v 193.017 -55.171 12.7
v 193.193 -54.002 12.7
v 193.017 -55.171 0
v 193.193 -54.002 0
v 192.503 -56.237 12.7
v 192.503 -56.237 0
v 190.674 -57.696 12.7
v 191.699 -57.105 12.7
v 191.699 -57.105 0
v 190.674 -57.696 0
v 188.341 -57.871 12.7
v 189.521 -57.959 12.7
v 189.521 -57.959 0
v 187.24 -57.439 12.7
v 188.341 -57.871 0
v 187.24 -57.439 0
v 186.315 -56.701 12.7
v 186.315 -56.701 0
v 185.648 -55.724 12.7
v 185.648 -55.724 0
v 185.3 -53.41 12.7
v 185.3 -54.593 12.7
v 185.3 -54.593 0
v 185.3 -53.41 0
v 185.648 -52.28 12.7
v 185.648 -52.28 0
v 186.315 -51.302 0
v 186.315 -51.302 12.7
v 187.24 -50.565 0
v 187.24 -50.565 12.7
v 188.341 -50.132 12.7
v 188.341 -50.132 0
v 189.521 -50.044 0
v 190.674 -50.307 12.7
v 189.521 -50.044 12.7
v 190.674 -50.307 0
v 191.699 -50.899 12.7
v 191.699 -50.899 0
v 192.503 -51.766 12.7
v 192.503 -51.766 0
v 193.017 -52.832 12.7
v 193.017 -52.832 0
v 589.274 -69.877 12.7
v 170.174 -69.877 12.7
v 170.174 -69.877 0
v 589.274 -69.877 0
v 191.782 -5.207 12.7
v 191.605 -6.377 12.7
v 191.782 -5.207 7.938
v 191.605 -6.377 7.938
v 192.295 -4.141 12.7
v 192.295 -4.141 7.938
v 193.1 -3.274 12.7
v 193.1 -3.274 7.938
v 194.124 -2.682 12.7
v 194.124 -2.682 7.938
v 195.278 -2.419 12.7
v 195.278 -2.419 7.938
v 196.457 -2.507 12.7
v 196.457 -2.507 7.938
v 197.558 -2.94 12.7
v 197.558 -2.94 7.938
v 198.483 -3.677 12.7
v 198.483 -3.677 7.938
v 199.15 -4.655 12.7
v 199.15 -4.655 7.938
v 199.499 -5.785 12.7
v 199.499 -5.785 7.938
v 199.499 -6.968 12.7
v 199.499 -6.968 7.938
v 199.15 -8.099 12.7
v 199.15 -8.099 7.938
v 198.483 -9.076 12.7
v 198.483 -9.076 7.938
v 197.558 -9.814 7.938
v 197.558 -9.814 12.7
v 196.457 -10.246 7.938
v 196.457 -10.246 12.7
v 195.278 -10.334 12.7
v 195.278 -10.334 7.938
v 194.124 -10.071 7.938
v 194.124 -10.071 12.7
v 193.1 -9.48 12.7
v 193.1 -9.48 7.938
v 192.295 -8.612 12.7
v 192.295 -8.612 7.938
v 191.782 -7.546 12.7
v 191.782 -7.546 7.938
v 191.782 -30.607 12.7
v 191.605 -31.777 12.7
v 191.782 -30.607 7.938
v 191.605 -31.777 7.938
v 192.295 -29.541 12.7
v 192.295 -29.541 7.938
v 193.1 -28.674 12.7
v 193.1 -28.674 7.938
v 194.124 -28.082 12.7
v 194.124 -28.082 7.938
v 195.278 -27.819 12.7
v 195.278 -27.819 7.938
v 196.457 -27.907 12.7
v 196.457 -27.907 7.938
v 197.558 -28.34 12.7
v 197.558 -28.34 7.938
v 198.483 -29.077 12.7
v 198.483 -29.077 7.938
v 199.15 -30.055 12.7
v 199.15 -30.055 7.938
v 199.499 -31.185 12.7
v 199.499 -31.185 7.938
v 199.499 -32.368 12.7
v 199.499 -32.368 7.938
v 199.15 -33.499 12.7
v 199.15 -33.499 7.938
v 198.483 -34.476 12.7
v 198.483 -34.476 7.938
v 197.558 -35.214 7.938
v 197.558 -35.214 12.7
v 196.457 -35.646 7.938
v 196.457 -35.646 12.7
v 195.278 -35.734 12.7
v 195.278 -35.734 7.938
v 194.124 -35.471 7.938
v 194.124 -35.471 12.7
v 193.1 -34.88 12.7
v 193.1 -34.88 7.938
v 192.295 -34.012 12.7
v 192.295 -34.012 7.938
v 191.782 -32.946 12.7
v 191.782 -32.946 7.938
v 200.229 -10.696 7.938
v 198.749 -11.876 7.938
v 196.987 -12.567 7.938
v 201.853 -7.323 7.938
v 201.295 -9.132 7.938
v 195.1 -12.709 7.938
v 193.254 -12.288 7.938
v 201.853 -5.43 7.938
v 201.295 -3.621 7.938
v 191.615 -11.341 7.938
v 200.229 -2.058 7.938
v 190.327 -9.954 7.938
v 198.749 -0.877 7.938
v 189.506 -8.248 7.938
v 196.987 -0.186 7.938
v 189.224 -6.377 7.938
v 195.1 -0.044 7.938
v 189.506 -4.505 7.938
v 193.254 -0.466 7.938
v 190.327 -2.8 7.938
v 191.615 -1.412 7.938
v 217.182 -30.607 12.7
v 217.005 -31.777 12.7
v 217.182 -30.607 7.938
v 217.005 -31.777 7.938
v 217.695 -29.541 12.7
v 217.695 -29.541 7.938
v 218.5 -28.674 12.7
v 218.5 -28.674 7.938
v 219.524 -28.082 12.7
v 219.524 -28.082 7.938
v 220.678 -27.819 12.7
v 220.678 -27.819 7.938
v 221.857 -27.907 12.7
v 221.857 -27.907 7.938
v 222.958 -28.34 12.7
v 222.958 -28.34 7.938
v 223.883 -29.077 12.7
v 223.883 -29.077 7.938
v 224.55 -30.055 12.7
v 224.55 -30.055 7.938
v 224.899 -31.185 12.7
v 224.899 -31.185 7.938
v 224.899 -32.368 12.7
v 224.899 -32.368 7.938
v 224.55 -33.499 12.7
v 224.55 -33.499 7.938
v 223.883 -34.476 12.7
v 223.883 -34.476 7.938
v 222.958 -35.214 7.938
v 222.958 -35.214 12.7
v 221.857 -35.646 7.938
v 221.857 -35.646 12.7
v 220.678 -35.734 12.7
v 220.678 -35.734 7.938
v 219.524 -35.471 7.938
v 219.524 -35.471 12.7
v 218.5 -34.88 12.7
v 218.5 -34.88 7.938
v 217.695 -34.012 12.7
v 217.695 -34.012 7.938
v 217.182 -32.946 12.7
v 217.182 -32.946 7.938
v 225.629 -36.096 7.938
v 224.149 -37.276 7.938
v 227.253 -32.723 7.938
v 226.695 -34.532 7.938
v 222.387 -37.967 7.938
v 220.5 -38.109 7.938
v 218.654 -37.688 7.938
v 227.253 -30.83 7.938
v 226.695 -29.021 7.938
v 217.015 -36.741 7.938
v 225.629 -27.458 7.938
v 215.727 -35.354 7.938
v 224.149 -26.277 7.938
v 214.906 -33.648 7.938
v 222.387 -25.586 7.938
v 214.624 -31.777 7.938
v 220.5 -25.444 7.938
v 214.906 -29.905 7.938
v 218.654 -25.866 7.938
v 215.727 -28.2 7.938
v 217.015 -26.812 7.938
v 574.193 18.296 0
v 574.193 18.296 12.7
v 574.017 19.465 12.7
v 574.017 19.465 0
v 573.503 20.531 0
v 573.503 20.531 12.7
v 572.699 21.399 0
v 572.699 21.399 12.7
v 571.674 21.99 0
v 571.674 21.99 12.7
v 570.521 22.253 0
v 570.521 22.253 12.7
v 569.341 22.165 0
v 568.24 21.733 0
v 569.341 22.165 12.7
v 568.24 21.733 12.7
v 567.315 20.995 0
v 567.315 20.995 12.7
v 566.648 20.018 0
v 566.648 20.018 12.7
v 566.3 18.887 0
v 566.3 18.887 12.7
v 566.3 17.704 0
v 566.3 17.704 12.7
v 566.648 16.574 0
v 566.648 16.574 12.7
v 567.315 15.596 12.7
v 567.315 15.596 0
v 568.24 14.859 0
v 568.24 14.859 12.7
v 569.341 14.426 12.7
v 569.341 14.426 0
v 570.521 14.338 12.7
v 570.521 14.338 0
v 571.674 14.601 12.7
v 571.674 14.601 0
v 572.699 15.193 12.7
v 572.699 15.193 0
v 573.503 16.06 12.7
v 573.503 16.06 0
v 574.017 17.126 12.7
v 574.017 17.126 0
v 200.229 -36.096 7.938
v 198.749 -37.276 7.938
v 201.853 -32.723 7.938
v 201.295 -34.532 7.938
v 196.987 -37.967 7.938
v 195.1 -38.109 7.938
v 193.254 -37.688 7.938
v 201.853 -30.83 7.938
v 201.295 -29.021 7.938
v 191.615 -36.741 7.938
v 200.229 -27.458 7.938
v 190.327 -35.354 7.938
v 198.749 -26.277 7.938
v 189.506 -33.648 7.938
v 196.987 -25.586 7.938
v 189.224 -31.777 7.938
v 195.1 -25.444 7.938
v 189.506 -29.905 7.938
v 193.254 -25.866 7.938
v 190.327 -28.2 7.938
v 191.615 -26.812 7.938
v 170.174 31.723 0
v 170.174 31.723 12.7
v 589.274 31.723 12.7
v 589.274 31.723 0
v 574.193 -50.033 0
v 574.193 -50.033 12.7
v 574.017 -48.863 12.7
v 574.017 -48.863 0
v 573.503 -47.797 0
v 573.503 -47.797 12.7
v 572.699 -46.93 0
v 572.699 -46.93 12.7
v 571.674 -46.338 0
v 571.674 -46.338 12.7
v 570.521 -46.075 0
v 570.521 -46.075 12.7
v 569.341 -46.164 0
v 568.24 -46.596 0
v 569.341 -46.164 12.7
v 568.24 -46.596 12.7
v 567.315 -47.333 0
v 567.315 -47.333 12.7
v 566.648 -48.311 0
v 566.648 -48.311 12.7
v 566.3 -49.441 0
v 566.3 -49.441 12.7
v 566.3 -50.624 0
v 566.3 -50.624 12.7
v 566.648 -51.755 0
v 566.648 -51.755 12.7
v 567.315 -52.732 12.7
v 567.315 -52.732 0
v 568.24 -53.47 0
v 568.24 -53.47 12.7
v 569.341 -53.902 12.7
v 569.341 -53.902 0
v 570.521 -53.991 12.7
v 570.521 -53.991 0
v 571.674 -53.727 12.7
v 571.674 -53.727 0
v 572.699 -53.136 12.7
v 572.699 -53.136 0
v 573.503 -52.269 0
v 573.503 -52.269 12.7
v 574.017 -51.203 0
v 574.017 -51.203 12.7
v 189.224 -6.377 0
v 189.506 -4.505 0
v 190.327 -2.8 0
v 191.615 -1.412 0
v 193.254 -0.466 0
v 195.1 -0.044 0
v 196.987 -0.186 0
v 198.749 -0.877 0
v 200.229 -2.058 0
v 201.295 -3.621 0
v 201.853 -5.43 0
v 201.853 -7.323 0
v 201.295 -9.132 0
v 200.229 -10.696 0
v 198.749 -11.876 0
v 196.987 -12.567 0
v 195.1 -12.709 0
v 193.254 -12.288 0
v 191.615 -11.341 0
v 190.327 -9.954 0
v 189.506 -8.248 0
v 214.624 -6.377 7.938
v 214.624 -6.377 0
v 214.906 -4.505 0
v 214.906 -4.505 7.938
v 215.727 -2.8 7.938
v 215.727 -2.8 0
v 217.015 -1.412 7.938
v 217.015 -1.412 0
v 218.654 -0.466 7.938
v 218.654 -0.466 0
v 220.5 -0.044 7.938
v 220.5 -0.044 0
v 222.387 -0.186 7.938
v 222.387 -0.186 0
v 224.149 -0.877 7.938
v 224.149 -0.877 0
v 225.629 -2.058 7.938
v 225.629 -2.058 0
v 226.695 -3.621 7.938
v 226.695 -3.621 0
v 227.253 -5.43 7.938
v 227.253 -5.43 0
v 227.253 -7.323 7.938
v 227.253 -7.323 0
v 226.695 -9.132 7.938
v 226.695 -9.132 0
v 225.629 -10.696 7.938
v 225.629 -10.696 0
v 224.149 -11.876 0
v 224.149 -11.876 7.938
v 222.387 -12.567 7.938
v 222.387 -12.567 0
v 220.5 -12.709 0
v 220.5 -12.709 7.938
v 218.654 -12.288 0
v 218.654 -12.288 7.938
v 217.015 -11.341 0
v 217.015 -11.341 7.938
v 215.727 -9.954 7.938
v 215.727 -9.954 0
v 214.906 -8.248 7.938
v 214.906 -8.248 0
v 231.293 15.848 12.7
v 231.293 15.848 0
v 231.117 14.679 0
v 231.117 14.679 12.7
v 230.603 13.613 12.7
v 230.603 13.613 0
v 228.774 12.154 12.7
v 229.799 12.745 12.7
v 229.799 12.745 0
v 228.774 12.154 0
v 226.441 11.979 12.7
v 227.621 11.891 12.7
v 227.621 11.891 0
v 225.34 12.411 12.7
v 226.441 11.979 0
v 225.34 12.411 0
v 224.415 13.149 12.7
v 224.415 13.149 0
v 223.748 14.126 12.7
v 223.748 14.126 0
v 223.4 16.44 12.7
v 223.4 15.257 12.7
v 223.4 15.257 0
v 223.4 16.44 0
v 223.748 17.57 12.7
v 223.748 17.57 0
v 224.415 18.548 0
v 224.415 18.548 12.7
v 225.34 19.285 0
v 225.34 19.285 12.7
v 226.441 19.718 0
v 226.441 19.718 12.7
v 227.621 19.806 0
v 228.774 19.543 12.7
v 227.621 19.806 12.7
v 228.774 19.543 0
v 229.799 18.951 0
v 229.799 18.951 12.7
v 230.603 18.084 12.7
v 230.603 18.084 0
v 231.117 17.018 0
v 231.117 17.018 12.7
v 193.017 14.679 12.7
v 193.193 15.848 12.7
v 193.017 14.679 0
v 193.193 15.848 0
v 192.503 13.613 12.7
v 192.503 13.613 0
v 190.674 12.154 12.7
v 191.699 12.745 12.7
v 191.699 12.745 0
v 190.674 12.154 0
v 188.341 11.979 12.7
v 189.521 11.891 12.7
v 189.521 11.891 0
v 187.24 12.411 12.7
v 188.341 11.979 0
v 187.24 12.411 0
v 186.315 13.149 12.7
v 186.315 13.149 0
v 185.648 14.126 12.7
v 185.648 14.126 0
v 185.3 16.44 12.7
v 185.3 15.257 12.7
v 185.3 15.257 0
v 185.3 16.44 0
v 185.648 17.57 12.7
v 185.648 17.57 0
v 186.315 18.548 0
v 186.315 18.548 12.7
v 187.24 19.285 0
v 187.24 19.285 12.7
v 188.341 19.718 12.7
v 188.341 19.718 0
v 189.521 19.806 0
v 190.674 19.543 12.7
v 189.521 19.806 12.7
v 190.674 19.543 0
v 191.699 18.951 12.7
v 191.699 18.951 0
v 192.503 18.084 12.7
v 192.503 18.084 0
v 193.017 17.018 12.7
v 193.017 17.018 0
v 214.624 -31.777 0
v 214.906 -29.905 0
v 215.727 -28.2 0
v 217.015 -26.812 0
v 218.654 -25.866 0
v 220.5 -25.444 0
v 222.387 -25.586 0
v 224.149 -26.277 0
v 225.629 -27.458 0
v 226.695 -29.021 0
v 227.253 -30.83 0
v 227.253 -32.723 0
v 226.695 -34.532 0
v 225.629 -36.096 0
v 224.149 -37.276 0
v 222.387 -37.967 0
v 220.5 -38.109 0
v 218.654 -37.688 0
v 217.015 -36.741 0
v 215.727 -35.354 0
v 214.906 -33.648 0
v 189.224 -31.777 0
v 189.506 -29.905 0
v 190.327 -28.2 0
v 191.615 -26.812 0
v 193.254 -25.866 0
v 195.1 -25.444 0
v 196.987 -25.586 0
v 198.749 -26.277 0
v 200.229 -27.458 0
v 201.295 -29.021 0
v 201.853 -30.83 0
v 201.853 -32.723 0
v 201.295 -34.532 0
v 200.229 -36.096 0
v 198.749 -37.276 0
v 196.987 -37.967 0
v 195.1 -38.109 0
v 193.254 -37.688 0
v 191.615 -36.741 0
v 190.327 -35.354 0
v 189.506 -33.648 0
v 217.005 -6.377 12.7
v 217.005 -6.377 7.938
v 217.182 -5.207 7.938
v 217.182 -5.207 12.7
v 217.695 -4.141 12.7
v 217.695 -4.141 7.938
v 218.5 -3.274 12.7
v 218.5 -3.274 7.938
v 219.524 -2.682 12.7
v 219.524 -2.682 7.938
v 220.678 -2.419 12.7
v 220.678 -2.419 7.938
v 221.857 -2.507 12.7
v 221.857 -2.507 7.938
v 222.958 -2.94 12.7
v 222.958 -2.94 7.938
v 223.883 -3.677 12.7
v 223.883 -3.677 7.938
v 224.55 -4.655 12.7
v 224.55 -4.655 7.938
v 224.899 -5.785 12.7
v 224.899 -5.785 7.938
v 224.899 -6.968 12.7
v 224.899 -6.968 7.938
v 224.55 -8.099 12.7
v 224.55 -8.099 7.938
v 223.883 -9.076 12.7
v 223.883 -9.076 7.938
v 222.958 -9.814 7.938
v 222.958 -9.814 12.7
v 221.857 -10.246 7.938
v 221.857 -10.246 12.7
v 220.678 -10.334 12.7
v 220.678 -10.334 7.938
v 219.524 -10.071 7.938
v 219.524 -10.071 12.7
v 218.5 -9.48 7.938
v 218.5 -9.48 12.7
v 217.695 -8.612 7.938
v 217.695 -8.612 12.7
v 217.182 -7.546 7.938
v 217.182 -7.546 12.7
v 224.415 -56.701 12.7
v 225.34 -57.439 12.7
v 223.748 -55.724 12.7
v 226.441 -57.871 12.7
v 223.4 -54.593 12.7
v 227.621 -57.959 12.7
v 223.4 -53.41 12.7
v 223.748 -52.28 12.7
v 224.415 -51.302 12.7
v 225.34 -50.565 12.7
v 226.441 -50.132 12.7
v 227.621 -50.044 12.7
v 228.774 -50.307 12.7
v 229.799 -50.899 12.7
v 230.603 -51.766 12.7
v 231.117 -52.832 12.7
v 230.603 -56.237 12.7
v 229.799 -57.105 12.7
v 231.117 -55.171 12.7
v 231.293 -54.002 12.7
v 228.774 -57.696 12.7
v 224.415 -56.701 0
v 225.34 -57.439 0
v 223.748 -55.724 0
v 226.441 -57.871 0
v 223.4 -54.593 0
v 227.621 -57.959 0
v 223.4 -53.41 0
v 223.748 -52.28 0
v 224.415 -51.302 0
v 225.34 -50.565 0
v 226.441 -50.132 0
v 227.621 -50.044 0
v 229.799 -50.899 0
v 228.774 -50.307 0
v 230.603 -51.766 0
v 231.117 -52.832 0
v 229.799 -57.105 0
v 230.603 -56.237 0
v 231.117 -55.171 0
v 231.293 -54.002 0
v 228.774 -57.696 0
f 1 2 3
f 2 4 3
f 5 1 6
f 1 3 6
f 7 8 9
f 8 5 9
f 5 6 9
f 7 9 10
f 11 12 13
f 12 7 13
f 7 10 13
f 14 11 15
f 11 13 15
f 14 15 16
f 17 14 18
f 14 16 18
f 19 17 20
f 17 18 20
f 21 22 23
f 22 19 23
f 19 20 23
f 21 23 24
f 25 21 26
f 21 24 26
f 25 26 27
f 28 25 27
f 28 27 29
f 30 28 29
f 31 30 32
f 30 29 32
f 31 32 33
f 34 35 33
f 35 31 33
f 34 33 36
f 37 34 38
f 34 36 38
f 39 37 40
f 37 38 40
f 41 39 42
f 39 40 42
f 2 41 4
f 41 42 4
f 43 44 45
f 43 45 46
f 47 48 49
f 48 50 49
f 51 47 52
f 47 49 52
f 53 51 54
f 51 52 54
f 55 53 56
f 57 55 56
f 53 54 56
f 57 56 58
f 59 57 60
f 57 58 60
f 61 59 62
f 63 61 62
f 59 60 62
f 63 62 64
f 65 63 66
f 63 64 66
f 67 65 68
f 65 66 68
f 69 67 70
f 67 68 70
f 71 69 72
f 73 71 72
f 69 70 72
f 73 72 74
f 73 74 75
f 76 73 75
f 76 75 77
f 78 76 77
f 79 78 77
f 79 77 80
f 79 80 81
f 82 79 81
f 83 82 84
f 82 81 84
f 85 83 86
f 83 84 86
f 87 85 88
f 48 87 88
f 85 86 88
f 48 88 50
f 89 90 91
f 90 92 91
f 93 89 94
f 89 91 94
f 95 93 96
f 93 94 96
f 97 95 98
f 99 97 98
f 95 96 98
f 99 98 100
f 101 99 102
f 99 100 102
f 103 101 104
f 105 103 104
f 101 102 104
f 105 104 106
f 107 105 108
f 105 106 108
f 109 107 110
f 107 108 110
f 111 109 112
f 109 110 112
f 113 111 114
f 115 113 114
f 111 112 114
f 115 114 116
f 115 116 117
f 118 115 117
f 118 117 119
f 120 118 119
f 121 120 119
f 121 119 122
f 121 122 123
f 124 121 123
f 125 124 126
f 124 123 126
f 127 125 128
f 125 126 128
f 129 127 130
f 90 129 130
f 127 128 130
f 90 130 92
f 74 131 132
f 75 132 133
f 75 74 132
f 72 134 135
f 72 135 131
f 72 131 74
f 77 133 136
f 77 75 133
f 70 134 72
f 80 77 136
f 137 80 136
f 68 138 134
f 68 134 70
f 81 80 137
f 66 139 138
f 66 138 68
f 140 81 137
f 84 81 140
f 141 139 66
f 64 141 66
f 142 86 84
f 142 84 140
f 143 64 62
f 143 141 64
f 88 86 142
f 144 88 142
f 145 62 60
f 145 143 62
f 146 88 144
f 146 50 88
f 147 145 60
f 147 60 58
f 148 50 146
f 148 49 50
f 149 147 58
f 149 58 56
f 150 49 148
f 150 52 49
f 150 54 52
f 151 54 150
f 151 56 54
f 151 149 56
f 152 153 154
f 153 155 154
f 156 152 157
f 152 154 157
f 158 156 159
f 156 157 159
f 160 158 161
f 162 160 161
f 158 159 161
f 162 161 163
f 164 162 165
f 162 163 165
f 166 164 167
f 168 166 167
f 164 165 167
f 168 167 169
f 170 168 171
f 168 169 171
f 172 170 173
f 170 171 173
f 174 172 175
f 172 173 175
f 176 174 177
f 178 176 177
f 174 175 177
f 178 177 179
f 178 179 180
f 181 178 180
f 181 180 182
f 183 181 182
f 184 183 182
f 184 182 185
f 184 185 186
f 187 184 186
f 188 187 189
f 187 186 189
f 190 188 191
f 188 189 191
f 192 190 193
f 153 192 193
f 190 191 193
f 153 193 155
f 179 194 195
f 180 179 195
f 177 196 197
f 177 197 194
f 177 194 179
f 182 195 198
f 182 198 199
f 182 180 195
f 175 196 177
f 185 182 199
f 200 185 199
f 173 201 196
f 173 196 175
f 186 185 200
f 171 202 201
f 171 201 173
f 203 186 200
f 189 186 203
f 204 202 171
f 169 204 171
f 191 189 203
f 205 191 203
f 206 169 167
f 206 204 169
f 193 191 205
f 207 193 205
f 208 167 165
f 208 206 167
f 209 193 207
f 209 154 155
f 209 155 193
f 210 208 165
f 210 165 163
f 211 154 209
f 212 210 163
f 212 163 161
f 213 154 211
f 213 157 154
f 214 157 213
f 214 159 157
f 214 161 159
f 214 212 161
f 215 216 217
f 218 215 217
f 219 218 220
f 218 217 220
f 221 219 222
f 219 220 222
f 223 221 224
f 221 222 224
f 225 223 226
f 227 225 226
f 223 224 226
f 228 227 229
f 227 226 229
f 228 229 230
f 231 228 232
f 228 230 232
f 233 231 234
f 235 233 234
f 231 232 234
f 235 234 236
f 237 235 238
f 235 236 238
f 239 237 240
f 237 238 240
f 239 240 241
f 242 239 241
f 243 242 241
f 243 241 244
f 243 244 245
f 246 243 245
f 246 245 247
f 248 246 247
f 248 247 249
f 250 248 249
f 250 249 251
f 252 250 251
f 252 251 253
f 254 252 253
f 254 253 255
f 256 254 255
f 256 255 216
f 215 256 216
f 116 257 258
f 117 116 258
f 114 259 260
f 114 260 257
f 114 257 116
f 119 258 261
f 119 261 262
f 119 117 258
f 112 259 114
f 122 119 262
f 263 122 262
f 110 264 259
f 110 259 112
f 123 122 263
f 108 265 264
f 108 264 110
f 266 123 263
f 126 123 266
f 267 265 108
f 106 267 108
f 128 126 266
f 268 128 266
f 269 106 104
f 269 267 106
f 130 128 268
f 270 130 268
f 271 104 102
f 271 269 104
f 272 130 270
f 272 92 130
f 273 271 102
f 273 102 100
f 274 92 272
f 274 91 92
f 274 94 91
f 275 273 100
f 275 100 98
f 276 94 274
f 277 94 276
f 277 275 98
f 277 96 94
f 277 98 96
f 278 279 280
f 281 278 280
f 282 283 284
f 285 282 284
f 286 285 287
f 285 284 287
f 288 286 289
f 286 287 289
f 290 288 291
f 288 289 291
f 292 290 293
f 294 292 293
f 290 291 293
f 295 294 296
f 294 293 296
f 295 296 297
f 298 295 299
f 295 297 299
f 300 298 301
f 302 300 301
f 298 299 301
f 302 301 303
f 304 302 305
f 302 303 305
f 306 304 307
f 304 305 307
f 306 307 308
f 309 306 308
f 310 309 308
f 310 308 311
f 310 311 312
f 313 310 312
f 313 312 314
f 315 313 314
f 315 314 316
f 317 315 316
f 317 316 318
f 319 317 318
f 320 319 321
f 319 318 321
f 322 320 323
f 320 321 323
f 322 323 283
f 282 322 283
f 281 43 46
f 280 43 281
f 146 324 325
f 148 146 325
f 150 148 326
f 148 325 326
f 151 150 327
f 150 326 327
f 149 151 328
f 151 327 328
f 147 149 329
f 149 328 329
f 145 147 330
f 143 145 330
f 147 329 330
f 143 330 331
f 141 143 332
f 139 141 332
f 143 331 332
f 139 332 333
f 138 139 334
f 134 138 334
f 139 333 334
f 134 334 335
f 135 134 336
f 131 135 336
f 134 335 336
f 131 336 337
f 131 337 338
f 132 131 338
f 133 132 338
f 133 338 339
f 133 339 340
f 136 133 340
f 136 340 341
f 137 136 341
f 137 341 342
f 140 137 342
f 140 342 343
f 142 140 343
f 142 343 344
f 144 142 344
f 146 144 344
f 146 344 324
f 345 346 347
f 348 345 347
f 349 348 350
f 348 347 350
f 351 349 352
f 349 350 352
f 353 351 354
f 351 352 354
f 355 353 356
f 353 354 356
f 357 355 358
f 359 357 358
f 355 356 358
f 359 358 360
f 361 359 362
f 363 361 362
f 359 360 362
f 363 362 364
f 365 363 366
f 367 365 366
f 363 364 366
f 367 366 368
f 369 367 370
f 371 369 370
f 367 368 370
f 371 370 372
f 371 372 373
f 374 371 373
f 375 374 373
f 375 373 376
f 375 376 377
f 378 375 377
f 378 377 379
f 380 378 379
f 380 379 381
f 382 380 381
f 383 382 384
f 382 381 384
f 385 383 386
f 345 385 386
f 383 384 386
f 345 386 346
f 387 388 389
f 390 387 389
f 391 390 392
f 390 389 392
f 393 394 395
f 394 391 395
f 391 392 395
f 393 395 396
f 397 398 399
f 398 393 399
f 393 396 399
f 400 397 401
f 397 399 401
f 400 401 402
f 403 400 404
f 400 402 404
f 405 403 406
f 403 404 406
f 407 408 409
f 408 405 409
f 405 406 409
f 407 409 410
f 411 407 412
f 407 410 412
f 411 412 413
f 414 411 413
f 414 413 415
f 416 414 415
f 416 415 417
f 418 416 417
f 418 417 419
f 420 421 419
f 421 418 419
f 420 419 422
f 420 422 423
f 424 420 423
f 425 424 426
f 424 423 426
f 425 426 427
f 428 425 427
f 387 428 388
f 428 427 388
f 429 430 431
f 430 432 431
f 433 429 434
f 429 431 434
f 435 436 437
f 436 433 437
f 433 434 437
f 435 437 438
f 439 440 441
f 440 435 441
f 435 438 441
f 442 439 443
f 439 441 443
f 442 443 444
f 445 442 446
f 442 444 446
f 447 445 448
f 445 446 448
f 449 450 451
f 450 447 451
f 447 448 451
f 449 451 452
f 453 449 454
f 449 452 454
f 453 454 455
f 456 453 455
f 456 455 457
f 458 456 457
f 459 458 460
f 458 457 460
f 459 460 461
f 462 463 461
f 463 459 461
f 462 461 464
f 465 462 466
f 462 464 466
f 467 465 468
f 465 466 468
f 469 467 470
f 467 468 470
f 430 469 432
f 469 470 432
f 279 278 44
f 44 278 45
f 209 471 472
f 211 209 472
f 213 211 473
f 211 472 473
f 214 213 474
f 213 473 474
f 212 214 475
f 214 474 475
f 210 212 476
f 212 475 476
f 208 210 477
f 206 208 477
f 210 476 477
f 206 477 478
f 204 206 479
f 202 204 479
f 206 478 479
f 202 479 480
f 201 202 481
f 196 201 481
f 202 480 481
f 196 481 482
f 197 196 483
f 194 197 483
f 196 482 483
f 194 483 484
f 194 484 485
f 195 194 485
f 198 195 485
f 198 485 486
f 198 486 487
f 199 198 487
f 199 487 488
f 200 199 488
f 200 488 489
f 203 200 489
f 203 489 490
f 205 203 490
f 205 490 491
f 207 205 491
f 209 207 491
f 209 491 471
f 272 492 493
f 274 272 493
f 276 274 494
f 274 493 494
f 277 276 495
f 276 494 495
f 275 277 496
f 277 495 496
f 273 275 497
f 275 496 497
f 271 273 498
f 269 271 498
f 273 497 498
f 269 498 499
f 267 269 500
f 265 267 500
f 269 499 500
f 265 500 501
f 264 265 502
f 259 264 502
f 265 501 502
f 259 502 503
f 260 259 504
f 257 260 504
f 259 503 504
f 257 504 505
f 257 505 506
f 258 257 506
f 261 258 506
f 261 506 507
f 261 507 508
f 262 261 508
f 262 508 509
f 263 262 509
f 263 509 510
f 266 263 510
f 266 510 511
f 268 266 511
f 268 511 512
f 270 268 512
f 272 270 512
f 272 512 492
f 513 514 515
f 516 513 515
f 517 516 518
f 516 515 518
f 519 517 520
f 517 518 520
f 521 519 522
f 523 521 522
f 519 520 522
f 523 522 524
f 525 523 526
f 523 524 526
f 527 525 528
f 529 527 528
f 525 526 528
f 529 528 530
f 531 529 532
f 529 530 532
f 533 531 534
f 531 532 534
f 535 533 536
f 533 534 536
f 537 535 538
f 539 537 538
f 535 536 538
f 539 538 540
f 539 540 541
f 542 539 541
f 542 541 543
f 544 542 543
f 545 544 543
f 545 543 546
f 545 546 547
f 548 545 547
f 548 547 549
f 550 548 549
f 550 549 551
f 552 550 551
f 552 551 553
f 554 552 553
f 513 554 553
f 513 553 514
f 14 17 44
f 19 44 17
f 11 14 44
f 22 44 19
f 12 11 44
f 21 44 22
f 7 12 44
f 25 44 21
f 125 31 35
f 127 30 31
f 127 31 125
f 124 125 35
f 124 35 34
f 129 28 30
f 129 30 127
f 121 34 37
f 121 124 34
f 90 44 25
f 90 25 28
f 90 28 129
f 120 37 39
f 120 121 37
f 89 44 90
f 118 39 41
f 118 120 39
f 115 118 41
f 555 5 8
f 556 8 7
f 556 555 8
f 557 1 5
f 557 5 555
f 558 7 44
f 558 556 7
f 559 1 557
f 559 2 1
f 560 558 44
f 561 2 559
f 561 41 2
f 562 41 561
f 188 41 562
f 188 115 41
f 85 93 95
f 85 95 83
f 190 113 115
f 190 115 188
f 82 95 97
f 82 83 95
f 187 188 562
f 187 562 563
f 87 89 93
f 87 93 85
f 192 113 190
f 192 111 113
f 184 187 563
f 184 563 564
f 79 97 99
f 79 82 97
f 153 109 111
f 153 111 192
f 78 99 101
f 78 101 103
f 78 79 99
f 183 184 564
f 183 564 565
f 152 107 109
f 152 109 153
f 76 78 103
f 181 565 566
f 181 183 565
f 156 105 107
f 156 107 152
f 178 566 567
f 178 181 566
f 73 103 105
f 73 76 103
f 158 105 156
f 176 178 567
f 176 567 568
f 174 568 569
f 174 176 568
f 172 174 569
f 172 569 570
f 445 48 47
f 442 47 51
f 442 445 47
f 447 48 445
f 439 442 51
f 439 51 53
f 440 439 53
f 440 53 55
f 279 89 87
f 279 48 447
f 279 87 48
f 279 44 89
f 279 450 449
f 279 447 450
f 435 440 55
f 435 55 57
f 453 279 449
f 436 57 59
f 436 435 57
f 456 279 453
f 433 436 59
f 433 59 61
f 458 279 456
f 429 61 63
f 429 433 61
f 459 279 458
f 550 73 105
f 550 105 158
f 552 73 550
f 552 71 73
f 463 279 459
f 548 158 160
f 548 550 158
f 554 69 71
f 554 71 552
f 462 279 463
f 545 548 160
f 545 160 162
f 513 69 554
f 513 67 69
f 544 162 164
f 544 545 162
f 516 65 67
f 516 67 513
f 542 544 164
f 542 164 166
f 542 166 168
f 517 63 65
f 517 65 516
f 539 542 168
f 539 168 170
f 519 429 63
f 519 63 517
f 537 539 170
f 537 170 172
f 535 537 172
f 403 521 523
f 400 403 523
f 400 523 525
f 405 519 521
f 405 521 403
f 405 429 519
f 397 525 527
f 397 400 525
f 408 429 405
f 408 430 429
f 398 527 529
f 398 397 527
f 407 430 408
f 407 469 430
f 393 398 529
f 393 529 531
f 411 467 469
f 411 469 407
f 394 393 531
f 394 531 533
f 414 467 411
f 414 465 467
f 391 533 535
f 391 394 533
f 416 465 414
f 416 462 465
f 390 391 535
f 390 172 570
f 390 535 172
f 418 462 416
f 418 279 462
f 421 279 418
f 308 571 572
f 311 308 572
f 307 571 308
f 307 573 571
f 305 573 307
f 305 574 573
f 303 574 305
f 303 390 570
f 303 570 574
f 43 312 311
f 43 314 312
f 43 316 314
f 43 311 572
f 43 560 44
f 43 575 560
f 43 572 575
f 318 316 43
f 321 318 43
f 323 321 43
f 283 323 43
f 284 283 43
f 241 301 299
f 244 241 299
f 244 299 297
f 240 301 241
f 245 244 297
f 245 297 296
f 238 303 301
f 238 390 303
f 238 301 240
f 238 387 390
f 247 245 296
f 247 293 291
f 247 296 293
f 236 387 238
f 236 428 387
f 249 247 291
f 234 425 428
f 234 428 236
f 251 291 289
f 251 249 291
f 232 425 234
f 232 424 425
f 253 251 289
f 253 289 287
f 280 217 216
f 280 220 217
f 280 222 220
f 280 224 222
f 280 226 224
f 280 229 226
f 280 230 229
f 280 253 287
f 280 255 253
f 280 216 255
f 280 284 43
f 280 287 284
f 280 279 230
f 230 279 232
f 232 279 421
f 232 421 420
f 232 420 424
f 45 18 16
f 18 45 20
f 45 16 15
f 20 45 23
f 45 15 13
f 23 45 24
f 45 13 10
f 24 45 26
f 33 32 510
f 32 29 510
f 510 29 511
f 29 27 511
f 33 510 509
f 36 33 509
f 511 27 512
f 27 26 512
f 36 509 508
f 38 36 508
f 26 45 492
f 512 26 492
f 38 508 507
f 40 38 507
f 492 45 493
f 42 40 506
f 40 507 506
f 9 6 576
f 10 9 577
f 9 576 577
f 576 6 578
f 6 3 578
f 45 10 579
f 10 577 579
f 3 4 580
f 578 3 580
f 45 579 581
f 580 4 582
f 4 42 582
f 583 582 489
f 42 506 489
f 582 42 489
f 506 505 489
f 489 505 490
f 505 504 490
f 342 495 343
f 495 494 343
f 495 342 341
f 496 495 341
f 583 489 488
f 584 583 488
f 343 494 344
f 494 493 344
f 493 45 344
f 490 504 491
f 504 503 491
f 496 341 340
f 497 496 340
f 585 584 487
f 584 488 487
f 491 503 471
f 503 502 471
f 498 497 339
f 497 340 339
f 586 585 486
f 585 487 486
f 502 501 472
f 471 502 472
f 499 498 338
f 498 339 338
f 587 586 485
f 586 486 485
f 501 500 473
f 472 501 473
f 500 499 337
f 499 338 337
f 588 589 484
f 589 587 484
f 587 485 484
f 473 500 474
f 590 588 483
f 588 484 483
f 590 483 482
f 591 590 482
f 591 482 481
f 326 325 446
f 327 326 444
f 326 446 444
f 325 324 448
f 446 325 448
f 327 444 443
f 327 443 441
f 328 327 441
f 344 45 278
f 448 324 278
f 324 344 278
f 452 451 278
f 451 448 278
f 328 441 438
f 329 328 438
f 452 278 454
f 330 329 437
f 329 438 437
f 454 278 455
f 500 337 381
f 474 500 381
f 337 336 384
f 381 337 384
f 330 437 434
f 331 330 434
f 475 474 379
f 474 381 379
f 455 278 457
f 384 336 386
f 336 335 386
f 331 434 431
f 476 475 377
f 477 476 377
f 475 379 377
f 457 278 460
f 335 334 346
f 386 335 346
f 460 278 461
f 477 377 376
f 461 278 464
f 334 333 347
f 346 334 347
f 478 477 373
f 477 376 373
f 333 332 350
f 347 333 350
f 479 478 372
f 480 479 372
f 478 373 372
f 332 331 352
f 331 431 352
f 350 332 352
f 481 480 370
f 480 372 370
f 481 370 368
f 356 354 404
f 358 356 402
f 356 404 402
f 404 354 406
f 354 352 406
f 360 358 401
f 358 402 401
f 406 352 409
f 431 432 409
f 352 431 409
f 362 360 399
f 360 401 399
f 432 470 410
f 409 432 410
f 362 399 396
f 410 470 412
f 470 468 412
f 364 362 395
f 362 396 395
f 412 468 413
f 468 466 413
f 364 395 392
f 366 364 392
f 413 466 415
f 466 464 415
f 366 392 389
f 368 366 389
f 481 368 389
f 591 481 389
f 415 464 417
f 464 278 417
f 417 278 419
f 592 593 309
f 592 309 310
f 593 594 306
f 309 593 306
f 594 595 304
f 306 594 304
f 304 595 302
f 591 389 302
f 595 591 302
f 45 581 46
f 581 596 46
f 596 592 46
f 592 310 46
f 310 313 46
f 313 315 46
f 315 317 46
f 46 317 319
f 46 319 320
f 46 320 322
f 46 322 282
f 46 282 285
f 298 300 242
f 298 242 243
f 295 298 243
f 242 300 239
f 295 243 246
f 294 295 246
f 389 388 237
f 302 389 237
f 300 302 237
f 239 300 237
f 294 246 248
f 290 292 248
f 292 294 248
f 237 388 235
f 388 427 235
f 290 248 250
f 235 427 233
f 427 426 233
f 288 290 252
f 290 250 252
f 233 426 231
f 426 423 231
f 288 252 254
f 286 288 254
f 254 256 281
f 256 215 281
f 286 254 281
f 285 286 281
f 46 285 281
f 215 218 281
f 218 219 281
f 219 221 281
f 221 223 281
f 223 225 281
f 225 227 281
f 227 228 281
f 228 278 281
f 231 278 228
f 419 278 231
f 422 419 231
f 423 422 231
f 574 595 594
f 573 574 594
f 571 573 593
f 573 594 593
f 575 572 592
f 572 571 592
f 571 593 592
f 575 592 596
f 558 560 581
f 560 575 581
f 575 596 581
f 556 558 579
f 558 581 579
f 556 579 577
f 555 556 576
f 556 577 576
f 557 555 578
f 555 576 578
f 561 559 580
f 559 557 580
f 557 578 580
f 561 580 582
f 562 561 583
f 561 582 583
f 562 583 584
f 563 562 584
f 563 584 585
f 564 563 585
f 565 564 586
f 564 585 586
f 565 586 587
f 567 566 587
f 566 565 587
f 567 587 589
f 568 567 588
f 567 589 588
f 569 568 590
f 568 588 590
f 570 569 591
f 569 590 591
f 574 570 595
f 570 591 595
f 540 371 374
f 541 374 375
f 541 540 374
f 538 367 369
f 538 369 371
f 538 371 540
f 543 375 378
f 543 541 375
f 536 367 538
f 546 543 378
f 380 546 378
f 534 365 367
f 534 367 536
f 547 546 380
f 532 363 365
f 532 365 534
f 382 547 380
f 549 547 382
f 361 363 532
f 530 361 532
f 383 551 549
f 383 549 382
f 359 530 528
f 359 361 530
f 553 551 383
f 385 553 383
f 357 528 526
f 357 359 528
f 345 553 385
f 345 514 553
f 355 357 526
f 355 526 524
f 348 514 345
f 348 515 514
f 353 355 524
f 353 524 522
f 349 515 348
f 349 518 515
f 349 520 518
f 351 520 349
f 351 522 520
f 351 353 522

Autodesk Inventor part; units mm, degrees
ref_plane "YZ Plane" through (0, 0, 0) normal (1, 0, 0) x (0, 1, 0)
ref_plane "XZ Plane" through (0, 0, 0) normal (0, 1, 0) x (-1, 0, 0)
ref_plane "XY Plane" through (0, 0, 0) normal (0, 0, 1) x (1, 0, 0)
sketch "Sketch1" plane through (0, 0, 0) normal (0, 0, 1) x (1, 0, 0)
  line L0 (246.3741, 31.7234) -> (246.3741, -882.6766) construction
  line L1 (234.1821, 31.7234) -> (231.3881, 31.7234) construction
  line L2 (223.2601, 31.7234) -> (220.4661, 31.7234) construction
  line L3 (199.5111, 31.7234) -> (196.0821, 31.7234) construction
  line L4 (182.3661, 31.7234) -> (178.9371, 31.7234) construction
  line L5 (246.3741, 31.7234) -> (170.1741, 31.7234)
  line L6 (170.1741, 31.7234) -> (170.1741, -69.8766)
  line L7 (170.1741, -69.8766) -> (246.3741, -69.8766)
  line L8 (246.3741, -69.8766) -> (246.3741, 31.7234)
  circle A0 centre (227.3241, 15.8484) radius 3.9688
  line L9 (208.2741, -69.8766) -> (208.2741, 31.7234) construction
  line L10 (246.3741, -19.0766) -> (170.1741, -19.0766) construction
  circle A1 centre (227.3241, -54.0016) radius 3.9688
  circle A2 centre (189.2241, 15.8484) radius 3.9688
  circle A3 centre (189.2241, -54.0016) radius 3.9688
  point P0 (0, 0)
  dimension "d0" = 76.2
  dimension "d1" = 101.6
  dimension "d2" = 7.9375
  dimension "d3" = 15.875
  dimension "d4" = 19.05
extrude "Extrusion1" add sketch "Sketch1" along normal blind 12.7
sketch "Sketch3" plane through (0, 0, 0) normal (0, 0, -1) x (-1, 0, 0)
  line L0 (-186.0491, -41.3016) -> (-230.4991, -41.3016)
  line L1 (-230.4991, -41.3016) -> (-230.4991, 3.1484)
  line L2 (-230.4991, 3.1484) -> (-186.0491, 3.1484)
  line L3 (-186.0491, 3.1484) -> (-186.0491, -41.3016)
  line L4 (-170.1741, -69.8766) -> (-246.3741, -69.8766) projected
  line L5 (-170.1741, 31.7234) -> (-170.1741, -69.8766) projected
  line L6 (-246.3741, 31.7234) -> (-170.1741, 31.7234) projected
  circle A0 centre (-195.5741, -6.3766) radius 6.35
  circle A1 centre (-195.5741, -31.7766) radius 6.35
  circle A2 centre (-220.9741, -6.3766) radius 6.35
  circle A3 centre (-220.9741, -31.7766) radius 6.35
  point P0 (0, 0)
  dimension "d16" = 44.45
  dimension "d17" = 44.45
  dimension "d18" = 28.575
  dimension "d19" = 15.875
  dimension "d23" = 12.7
  dimension "d24" = 9.525
  dimension "d25" = 9.525
  dimension "d28" = 25.4
  dimension "d31" = 25.4
extrude "Extrusion3" cut sketch "Sketch3" against normal blind 7.9375 contours A0 | A1 | A2 | A3
sketch "Sketch4" plane through (195.5741, -6.3766, 7.9375) normal (0, 0, -1) x (-1, 0, 0)
  circle A0 centre (0, 0) radius 6.35 projected
  circle A1 centre (0, -25.4) radius 6.35 projected
  circle A2 centre (-25.4, 0) radius 6.35 projected
  circle A3 centre (-25.4, -25.4) radius 6.35 projected
  circle A4 centre (0, 0) radius 3.9688
  line L0 (0, 0) -> (0, -11.1628) construction
  line L1 (0, 0) -> (-15.7699, 0) construction
  circle A5 centre (0, -25.4) radius 3.9688
  circle A6 centre (-25.4, 0) radius 3.9688
  circle A7 centre (-25.4, -25.4) radius 3.9688
  point P0 (195.5741, 6.3766)
  dimension "d36" = 7.9375
  dimension "d37" = 7.9375
  dimension "d38" = 7.9375
  dimension "d39" = 7.9375
extrude "Extrusion4" cut sketch "Sketch4" against normal blind 7.9375 contours A4 | A5 | A6 | A7
sketch "Sketch5" plane through (0, 0, 12.7) normal (0, 0, 1) x (1, 0, 0)
  line L0 (589.2741, -69.8766) -> (589.2741, 844.5234)
  line L1 (246.3741, -69.8766) -> (589.2741, -69.8766)
  line L2 (246.3741, 31.7234) -> (170.1741, 31.7234) projected
  line L3 (246.3741, 31.7234) -> (589.2741, 31.7234)
  line L4 (376.7143, 0.5706) -> (376.7143, -56.5544)
  line L5 (376.7143, 18.2956) -> (376.7143, 9.7706)
  line L6 (376.7143, 18.2956) -> (376.7143, 23.7956)
  line L7 (376.7143, -62.0544) -> (376.7143, -56.5544)
  circle A0 centre (227.3241, 15.8484) radius 3.9688 projected
  circle A1 centre (227.3241, -54.0016) radius 3.9688 projected
  circle A2 centre (570.2241, 18.2956) radius 3.9688
  circle A3 centre (570.2241, -50.0328) radius 3.9688
  line L8 (246.3741, 31.7234) -> (246.3741, -69.8766)
  point P0 (0, 0)
  dimension "d42" = 7.9375
  dimension "d43" = 7.9375
  dimension "d44" = 19.05
  dimension "d45" = 19.05
extrude "Extrusion5" add sketch "Sketch5" against normal blind 12.7 contours L1 L8 L3 L0
properties part number "Corner Stands"
